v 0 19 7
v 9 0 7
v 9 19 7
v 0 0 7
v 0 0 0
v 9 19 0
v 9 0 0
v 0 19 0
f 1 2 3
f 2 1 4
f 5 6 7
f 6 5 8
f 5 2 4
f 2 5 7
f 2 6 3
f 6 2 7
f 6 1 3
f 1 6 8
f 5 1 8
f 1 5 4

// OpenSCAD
// Generated by SolidPython 1.0.1 on 2020-07-29 00:46:55


cube(size = [9, 19, 7]);
/***********************************************
*********      SolidPython code:      **********
************************************************
 
# import packages: SolidPython
from solid import *
from solid.utils import *
from itertools import chain, combinations, permutations


class Resize:

    def __init__(self, scad_file):
        self.scad_file = scad_file
        #self.scad_file = import_scad(scad_file)
        # cone/cylinder param:
        self.r1 = 0
        self.r2 = 0
        self.h = 0
        # rectangular prism param:
        self.w = 0
        self.l = 0
        # ellipse param:
        self.r = 0

    # import OpenScad code (file name corresponds to shape)


    # classify shape + parameters
    def assign(self, param1, param2, param3):
        if self.scad_file == 'cone.scad':
            self.r1 = param1
            self.r2 = param2
            self.h = param3
        elif self.scad_file == 'cylinder.scad':
            self.r1 = param1
            self.r2 = param2
            self.h = param3
        elif self.scad_file == 'rectangularPrism.scad':
            self.h = param1
            self.l = param2
            self.w = param3
        else:
            self.r = param1
            self.h = param2

    # resize parameters
    def iterate(self):
        x = range(3, 20, 2)
        i = 1
        if self.scad_file == 'cone.scad':
            tempList = list(permutations(x, 2))
            for temp in tempList:
                param1 = temp[0]
                param2 = temp[1]
                filepath = 'produced_scad_files/' + 'cone' + str(param1) + '_' + str(param2) + '_' + '.scad'
                scad_render_to_file(cylinder(h=param1, r1=param2, r2=0), filepath)

        elif self.scad_file == 'cylinder.scad':
            tempList = list(permutations(x, 3))
            for temp in tempList:
                param1 = temp[0]
                param2 = temp[1]
                filepath = 'produced_scad_files/' + 'cylinder' + str(param1) + '_' + str(param2) + '_' + '.scad'
                scad_render_to_file(cylinder(h=param1, r1=param2, r2=param2), filepath)

        elif self.scad_file == 'rectangularPrism.scad':
            tempList = list(permutations(x, 3))
            for temp in tempList:
                param1 = temp[0]
                param2 = temp[1]
                param3 = temp[2]
                filepath = 'produced_scad_files/' + 'rectangularPrism' + str(param1) + '_' + str(param2) + '_' + str(
                    param3) + '.scad'
                scad_render_to_file(cube(size=(param1, param2, param3)), filepath)

        elif self.scad_file == 'ellipse.scad':
            tempList = list(permutations(x, 4))
            for temp in tempList:
                param1 = temp[0]
                param2 = temp[1]
                param3 = temp[2]
                param4 = temp[3]
                filepath = 'produced_scad_files/' + 'ellipse' + str(param1) + '_' + str(param2) + '_' + str(param3) + '_' + str(param4) + '.scad'
                scad_render_to_file(scale([param1, param2, param3])(sphere(r=param4)), filepath)

    def render_to_scadfile(self):
        scad_render_to_file(scad, 'example.scad') 
 
************************************************/
